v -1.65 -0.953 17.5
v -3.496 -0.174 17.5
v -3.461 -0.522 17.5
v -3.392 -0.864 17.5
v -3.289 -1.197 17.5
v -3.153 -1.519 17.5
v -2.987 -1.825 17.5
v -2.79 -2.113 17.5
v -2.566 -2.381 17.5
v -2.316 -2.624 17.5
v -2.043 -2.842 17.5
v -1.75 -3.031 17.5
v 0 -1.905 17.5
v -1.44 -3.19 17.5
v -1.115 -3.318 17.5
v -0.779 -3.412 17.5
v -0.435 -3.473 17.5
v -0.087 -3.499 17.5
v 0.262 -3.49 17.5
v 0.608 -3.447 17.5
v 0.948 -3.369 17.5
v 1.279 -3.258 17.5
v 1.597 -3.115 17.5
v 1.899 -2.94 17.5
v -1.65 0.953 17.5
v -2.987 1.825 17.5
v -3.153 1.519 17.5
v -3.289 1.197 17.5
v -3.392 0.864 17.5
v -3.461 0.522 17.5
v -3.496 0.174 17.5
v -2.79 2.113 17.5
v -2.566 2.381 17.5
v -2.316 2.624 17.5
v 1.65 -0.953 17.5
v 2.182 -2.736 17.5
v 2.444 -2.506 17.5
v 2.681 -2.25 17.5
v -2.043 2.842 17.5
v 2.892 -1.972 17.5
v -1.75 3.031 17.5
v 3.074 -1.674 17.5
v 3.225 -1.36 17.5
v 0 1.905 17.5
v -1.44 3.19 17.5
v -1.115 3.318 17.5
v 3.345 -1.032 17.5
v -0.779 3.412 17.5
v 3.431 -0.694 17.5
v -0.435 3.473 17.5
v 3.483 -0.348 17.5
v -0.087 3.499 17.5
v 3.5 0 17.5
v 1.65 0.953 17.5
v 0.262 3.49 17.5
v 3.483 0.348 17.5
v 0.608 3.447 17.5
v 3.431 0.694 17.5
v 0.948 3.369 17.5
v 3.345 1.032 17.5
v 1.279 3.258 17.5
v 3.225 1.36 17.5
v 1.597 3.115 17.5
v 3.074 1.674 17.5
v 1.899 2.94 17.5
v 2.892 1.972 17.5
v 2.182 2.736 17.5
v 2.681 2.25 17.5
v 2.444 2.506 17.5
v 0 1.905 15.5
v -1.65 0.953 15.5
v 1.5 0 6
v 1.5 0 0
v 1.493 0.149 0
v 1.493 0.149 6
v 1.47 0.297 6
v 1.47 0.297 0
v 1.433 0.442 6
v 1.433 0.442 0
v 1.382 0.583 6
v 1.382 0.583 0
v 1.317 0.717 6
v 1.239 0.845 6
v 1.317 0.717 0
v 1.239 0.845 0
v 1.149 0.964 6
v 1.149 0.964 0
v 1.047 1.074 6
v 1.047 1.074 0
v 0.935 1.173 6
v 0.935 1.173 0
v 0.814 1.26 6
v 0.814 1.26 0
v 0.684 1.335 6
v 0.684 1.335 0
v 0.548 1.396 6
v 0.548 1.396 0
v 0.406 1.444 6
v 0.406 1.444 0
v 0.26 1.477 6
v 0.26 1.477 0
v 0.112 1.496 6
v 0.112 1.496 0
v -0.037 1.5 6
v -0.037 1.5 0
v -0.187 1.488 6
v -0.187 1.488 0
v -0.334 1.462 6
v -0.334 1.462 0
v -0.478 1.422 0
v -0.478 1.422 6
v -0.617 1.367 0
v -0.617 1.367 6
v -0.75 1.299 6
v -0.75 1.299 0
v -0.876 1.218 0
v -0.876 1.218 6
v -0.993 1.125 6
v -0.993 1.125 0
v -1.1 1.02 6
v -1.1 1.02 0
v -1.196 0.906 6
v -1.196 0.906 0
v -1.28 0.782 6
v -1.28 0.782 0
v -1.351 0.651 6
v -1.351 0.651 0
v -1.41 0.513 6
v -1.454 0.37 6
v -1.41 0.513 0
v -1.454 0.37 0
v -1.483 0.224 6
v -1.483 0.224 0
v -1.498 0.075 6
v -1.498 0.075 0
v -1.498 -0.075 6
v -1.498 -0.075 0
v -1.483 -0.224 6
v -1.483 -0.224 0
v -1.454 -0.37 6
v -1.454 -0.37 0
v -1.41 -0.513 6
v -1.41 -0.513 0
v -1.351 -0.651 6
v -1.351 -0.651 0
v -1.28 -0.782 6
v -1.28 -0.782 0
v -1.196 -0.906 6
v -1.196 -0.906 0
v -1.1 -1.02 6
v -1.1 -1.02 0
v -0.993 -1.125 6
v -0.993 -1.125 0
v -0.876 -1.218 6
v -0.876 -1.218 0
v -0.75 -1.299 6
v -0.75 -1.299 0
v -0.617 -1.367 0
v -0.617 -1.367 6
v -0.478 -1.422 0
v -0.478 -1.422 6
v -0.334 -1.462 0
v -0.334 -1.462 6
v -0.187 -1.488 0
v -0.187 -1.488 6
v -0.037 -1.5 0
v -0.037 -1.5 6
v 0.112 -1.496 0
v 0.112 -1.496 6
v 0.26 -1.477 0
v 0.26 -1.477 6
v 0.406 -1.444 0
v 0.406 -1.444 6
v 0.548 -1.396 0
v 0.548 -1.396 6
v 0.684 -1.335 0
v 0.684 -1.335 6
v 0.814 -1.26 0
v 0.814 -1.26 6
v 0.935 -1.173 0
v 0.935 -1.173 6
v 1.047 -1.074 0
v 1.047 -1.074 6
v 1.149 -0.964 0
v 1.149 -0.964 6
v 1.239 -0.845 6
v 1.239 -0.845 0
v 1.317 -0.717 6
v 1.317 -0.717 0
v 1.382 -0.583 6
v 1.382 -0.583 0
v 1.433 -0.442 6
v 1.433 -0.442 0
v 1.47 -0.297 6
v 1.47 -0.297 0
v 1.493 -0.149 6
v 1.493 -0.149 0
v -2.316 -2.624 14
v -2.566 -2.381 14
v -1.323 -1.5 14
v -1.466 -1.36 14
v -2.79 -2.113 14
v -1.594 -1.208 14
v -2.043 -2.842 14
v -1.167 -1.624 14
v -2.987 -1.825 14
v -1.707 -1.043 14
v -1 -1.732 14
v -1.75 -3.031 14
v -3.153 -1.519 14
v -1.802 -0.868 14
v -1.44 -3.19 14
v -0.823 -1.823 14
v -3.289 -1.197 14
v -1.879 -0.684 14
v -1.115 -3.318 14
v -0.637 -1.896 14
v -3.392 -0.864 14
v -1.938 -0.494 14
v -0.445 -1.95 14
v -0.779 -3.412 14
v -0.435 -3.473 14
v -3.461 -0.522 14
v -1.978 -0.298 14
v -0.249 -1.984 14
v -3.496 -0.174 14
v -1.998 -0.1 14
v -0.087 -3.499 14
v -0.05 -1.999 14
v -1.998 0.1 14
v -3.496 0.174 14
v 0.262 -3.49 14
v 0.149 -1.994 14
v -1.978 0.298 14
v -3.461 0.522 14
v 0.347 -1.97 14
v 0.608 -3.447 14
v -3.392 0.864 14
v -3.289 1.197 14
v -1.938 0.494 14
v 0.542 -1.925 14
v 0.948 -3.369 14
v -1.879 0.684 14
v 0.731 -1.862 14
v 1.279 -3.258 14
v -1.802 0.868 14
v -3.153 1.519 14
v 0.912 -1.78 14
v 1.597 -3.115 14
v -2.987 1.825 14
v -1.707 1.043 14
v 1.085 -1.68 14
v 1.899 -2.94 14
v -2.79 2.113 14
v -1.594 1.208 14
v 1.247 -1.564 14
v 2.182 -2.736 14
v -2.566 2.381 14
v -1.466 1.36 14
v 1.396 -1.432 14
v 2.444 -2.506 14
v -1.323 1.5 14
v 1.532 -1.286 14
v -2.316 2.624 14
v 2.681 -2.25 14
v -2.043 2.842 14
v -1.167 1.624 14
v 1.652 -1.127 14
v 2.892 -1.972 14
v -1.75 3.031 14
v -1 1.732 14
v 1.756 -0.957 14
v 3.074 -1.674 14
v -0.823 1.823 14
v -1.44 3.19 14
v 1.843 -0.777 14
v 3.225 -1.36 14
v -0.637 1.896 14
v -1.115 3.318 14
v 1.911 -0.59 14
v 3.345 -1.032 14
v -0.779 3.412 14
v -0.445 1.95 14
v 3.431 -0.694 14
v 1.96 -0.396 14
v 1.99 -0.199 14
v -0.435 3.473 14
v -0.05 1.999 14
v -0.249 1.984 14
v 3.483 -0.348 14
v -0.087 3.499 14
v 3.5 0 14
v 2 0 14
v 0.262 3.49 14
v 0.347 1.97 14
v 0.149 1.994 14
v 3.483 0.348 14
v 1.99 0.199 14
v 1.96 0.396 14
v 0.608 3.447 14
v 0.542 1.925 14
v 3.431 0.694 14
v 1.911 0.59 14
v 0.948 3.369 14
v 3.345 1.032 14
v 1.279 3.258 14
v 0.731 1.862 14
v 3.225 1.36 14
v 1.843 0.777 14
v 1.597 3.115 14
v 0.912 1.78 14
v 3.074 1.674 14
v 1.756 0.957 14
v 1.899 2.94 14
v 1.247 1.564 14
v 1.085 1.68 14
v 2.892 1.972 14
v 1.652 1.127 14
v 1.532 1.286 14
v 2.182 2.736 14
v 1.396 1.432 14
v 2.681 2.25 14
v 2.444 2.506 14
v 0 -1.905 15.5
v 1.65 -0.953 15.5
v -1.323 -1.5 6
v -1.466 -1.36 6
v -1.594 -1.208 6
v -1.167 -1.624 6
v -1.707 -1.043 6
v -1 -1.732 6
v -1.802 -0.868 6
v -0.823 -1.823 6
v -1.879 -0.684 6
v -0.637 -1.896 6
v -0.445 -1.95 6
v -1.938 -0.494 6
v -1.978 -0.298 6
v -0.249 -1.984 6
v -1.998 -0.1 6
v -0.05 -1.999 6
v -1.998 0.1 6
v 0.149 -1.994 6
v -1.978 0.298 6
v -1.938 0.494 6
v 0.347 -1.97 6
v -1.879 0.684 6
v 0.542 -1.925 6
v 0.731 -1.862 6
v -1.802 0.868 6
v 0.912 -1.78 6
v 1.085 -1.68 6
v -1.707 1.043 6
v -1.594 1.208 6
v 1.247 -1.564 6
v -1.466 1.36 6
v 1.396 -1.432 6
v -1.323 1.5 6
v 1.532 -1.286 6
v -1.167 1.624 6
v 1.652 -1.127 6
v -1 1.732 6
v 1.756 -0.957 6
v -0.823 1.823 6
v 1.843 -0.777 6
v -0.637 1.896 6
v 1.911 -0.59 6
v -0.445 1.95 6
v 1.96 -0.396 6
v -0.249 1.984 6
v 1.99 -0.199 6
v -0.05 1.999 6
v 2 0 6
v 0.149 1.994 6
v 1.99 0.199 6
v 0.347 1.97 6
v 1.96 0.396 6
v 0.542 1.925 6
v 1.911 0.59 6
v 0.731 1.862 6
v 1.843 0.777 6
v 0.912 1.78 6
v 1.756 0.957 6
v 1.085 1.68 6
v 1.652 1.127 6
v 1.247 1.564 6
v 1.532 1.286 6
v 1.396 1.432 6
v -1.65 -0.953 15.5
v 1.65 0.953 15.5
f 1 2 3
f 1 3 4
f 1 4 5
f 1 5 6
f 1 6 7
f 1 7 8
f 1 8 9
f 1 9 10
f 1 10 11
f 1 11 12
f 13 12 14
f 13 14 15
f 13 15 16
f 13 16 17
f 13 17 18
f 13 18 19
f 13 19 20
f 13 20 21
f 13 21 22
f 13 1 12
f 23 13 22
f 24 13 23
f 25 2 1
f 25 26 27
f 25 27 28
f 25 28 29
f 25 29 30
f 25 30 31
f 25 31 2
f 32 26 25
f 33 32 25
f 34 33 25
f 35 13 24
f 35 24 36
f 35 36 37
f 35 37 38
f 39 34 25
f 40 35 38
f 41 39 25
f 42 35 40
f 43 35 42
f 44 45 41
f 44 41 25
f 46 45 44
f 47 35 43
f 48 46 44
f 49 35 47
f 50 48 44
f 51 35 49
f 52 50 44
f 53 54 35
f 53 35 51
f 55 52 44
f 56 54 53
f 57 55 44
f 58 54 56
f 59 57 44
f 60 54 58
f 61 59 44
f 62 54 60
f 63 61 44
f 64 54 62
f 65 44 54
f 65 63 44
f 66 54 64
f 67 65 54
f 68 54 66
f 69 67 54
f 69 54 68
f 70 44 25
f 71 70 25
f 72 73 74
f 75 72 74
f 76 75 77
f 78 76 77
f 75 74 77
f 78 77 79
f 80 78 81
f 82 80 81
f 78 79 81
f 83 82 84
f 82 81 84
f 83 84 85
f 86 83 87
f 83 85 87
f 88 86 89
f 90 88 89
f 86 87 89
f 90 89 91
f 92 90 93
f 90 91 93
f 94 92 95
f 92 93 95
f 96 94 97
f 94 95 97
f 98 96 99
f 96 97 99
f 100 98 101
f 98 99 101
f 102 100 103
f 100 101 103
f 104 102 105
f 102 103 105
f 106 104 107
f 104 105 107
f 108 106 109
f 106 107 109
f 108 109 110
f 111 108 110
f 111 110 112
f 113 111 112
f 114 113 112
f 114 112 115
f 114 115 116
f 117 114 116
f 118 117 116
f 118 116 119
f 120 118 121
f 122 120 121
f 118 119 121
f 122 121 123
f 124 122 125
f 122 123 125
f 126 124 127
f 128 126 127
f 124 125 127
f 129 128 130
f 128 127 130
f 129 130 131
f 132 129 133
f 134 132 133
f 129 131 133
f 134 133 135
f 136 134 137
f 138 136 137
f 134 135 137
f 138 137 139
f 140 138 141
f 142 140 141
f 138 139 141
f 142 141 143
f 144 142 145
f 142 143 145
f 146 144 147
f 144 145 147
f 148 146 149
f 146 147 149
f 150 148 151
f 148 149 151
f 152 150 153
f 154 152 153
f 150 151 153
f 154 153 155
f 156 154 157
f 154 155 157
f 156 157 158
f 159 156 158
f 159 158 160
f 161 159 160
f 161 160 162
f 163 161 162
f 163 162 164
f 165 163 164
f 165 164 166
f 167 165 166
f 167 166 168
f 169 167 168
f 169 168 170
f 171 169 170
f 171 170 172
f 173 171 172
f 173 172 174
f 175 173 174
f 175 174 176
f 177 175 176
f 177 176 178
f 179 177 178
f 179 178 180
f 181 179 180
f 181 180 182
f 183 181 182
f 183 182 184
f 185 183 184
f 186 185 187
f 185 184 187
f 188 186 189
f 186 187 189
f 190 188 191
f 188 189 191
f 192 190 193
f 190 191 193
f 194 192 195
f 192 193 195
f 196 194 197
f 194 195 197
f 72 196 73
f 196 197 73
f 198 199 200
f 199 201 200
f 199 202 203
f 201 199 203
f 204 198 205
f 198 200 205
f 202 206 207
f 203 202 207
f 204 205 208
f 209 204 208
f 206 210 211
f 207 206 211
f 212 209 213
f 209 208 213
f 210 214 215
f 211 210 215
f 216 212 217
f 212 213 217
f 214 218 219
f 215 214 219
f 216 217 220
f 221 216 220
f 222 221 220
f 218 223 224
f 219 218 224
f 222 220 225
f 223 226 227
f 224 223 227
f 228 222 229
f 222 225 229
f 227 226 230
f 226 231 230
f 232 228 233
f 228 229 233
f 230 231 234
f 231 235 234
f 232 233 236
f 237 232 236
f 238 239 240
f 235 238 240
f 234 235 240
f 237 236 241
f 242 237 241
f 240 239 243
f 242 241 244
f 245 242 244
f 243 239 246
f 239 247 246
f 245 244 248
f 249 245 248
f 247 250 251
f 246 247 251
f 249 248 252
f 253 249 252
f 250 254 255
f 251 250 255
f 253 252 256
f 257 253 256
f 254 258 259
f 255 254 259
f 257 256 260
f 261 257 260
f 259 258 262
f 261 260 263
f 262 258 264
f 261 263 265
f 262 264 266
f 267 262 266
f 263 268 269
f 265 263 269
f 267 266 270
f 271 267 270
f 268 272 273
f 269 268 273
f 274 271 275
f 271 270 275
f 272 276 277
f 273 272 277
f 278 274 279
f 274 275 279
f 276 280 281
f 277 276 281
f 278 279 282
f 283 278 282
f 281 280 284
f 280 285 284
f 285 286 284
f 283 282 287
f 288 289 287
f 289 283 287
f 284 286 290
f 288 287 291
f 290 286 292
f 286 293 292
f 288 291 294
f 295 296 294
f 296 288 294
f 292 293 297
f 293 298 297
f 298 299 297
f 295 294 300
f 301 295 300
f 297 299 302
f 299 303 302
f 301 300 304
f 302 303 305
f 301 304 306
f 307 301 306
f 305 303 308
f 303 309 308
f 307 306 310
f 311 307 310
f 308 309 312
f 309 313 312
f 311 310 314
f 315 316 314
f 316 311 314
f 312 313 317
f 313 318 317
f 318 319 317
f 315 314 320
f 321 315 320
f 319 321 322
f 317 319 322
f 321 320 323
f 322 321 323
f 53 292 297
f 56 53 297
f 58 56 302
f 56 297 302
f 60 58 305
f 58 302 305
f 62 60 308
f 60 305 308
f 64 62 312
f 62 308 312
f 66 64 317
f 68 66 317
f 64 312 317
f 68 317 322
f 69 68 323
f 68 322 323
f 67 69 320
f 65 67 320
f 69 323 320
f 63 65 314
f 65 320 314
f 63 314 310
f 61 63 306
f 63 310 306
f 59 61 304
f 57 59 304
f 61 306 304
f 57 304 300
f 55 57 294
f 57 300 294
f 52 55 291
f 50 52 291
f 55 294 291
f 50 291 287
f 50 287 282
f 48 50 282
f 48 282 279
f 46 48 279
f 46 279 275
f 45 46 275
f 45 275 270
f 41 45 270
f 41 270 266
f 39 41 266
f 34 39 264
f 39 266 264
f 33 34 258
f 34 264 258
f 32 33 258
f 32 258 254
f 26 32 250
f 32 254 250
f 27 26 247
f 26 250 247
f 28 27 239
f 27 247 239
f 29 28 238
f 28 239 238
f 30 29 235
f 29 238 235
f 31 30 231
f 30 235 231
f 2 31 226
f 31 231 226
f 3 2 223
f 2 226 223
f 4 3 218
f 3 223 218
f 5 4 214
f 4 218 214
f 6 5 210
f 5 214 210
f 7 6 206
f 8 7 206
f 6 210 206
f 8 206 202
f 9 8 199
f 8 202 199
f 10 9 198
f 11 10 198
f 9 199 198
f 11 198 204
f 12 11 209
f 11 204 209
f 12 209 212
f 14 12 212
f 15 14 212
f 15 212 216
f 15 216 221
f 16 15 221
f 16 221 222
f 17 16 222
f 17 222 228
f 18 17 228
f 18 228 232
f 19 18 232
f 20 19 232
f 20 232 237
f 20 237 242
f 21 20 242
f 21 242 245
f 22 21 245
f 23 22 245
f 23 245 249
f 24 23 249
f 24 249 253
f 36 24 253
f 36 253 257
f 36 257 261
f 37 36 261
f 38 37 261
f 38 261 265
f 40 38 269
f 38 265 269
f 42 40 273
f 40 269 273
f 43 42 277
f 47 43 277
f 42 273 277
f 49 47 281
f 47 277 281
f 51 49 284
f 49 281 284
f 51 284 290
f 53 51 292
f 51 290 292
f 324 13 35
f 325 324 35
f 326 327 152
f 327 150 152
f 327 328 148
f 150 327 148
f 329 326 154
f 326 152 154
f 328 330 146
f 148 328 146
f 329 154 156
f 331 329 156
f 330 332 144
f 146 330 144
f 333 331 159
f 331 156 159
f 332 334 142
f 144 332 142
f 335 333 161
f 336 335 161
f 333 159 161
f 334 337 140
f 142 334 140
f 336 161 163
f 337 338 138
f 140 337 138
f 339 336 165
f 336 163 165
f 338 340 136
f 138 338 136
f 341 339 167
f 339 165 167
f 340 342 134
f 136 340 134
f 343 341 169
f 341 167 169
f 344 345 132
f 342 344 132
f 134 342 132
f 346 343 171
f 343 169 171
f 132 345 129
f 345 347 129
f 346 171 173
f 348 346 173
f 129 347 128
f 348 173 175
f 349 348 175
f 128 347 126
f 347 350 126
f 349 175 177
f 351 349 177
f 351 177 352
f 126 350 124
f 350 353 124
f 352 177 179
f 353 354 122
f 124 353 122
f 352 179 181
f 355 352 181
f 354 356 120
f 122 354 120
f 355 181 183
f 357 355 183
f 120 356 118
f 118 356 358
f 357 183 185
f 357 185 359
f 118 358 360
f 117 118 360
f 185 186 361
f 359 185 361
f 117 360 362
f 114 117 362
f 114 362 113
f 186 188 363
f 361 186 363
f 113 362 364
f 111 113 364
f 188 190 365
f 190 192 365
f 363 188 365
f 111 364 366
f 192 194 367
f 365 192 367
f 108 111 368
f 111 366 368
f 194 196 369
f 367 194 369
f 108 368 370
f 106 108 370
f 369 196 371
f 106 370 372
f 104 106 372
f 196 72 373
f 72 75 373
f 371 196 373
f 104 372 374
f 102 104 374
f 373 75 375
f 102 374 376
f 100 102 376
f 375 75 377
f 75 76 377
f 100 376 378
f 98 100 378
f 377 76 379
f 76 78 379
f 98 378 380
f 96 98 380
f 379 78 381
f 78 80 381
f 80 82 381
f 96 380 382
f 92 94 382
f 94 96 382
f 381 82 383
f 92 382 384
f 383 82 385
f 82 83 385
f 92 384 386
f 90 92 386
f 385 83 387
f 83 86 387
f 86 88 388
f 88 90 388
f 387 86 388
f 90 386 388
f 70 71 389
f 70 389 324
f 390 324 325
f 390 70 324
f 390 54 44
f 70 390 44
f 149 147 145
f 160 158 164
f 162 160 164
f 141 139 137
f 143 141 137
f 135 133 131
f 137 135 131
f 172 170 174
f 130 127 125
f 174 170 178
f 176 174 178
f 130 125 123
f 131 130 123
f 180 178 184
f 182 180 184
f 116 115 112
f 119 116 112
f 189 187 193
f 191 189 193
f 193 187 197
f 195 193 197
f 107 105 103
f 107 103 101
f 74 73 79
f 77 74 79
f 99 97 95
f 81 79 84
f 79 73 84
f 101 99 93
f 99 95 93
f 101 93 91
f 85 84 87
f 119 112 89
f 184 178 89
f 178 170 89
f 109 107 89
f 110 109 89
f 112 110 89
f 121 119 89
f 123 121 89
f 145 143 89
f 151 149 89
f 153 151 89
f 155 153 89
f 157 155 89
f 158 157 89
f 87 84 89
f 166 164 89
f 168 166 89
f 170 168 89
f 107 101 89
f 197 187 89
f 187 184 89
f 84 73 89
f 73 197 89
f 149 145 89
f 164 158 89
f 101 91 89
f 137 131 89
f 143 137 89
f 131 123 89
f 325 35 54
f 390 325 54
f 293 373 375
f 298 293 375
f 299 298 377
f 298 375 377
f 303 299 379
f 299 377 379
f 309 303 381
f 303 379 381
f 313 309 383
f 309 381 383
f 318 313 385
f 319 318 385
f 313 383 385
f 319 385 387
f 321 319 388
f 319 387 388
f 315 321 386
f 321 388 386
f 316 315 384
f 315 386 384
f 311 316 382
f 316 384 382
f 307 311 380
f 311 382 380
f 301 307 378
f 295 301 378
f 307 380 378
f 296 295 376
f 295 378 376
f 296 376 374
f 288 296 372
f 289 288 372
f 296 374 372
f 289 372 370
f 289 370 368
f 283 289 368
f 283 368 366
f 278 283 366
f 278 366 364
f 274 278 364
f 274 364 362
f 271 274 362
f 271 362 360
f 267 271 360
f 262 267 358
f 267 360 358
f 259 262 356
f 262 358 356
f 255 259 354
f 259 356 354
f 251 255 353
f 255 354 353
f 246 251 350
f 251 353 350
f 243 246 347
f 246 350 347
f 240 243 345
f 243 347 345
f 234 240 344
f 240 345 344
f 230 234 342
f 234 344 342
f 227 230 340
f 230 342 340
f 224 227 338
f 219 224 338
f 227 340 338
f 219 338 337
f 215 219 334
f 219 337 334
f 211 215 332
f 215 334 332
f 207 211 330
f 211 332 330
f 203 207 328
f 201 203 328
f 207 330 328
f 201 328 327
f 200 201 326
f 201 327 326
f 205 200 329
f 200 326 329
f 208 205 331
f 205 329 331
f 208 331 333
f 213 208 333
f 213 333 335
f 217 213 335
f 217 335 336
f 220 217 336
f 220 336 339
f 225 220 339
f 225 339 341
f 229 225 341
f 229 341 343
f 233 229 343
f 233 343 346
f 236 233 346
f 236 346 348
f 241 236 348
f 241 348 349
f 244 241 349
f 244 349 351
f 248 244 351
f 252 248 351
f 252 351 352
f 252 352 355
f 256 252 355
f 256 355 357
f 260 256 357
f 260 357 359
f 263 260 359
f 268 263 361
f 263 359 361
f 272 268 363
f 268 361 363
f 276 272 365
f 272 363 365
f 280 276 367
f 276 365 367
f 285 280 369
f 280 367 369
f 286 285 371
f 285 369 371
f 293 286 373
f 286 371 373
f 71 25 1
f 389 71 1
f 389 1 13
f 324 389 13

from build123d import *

# Parameters (mm, degrees)
SKETCH_1_R          = 1.5
EXTRUDE_1_DEPTH     = 6
SKETCH_2_R          = 2
EXTRUDE_2_DEPTH     = 8
SKETCH_3_R          = 3.5
EXTRUDE_3_DEPTH     = 3.5
CUT_EXTRUDE_1_DEPTH = 2


with BuildPart() as part:
    # 草图1 → 凸台-拉伸1 (new body)
    with BuildSketch(Plane.XY):
        Circle(SKETCH_1_R)
    extrude(amount=EXTRUDE_1_DEPTH)

    # 草图2 → 凸台-拉伸2 (add)
    with BuildSketch(Plane.XY.offset(6)):
        Circle(SKETCH_2_R)
    extrude(amount=EXTRUDE_2_DEPTH)

    # 草图3 → 凸台-拉伸3 (add)
    with BuildSketch(Plane.XY.offset(14)):
        Circle(SKETCH_3_R)
    extrude(amount=EXTRUDE_3_DEPTH)

    # 草图4 → 切除-拉伸1 (cut)
    with BuildSketch(Plane.XY.offset(17.5)):
        Polygon((0, 1.905255888), (-1.65, 0.952627944), (-1.65, -0.952627944), (0, -1.905255888), (1.65, -0.952627944), (1.65, 0.952627944), align=None)
    extrude(amount=-CUT_EXTRUDE_1_DEPTH, mode=Mode.SUBTRACT)


solid = part.part
